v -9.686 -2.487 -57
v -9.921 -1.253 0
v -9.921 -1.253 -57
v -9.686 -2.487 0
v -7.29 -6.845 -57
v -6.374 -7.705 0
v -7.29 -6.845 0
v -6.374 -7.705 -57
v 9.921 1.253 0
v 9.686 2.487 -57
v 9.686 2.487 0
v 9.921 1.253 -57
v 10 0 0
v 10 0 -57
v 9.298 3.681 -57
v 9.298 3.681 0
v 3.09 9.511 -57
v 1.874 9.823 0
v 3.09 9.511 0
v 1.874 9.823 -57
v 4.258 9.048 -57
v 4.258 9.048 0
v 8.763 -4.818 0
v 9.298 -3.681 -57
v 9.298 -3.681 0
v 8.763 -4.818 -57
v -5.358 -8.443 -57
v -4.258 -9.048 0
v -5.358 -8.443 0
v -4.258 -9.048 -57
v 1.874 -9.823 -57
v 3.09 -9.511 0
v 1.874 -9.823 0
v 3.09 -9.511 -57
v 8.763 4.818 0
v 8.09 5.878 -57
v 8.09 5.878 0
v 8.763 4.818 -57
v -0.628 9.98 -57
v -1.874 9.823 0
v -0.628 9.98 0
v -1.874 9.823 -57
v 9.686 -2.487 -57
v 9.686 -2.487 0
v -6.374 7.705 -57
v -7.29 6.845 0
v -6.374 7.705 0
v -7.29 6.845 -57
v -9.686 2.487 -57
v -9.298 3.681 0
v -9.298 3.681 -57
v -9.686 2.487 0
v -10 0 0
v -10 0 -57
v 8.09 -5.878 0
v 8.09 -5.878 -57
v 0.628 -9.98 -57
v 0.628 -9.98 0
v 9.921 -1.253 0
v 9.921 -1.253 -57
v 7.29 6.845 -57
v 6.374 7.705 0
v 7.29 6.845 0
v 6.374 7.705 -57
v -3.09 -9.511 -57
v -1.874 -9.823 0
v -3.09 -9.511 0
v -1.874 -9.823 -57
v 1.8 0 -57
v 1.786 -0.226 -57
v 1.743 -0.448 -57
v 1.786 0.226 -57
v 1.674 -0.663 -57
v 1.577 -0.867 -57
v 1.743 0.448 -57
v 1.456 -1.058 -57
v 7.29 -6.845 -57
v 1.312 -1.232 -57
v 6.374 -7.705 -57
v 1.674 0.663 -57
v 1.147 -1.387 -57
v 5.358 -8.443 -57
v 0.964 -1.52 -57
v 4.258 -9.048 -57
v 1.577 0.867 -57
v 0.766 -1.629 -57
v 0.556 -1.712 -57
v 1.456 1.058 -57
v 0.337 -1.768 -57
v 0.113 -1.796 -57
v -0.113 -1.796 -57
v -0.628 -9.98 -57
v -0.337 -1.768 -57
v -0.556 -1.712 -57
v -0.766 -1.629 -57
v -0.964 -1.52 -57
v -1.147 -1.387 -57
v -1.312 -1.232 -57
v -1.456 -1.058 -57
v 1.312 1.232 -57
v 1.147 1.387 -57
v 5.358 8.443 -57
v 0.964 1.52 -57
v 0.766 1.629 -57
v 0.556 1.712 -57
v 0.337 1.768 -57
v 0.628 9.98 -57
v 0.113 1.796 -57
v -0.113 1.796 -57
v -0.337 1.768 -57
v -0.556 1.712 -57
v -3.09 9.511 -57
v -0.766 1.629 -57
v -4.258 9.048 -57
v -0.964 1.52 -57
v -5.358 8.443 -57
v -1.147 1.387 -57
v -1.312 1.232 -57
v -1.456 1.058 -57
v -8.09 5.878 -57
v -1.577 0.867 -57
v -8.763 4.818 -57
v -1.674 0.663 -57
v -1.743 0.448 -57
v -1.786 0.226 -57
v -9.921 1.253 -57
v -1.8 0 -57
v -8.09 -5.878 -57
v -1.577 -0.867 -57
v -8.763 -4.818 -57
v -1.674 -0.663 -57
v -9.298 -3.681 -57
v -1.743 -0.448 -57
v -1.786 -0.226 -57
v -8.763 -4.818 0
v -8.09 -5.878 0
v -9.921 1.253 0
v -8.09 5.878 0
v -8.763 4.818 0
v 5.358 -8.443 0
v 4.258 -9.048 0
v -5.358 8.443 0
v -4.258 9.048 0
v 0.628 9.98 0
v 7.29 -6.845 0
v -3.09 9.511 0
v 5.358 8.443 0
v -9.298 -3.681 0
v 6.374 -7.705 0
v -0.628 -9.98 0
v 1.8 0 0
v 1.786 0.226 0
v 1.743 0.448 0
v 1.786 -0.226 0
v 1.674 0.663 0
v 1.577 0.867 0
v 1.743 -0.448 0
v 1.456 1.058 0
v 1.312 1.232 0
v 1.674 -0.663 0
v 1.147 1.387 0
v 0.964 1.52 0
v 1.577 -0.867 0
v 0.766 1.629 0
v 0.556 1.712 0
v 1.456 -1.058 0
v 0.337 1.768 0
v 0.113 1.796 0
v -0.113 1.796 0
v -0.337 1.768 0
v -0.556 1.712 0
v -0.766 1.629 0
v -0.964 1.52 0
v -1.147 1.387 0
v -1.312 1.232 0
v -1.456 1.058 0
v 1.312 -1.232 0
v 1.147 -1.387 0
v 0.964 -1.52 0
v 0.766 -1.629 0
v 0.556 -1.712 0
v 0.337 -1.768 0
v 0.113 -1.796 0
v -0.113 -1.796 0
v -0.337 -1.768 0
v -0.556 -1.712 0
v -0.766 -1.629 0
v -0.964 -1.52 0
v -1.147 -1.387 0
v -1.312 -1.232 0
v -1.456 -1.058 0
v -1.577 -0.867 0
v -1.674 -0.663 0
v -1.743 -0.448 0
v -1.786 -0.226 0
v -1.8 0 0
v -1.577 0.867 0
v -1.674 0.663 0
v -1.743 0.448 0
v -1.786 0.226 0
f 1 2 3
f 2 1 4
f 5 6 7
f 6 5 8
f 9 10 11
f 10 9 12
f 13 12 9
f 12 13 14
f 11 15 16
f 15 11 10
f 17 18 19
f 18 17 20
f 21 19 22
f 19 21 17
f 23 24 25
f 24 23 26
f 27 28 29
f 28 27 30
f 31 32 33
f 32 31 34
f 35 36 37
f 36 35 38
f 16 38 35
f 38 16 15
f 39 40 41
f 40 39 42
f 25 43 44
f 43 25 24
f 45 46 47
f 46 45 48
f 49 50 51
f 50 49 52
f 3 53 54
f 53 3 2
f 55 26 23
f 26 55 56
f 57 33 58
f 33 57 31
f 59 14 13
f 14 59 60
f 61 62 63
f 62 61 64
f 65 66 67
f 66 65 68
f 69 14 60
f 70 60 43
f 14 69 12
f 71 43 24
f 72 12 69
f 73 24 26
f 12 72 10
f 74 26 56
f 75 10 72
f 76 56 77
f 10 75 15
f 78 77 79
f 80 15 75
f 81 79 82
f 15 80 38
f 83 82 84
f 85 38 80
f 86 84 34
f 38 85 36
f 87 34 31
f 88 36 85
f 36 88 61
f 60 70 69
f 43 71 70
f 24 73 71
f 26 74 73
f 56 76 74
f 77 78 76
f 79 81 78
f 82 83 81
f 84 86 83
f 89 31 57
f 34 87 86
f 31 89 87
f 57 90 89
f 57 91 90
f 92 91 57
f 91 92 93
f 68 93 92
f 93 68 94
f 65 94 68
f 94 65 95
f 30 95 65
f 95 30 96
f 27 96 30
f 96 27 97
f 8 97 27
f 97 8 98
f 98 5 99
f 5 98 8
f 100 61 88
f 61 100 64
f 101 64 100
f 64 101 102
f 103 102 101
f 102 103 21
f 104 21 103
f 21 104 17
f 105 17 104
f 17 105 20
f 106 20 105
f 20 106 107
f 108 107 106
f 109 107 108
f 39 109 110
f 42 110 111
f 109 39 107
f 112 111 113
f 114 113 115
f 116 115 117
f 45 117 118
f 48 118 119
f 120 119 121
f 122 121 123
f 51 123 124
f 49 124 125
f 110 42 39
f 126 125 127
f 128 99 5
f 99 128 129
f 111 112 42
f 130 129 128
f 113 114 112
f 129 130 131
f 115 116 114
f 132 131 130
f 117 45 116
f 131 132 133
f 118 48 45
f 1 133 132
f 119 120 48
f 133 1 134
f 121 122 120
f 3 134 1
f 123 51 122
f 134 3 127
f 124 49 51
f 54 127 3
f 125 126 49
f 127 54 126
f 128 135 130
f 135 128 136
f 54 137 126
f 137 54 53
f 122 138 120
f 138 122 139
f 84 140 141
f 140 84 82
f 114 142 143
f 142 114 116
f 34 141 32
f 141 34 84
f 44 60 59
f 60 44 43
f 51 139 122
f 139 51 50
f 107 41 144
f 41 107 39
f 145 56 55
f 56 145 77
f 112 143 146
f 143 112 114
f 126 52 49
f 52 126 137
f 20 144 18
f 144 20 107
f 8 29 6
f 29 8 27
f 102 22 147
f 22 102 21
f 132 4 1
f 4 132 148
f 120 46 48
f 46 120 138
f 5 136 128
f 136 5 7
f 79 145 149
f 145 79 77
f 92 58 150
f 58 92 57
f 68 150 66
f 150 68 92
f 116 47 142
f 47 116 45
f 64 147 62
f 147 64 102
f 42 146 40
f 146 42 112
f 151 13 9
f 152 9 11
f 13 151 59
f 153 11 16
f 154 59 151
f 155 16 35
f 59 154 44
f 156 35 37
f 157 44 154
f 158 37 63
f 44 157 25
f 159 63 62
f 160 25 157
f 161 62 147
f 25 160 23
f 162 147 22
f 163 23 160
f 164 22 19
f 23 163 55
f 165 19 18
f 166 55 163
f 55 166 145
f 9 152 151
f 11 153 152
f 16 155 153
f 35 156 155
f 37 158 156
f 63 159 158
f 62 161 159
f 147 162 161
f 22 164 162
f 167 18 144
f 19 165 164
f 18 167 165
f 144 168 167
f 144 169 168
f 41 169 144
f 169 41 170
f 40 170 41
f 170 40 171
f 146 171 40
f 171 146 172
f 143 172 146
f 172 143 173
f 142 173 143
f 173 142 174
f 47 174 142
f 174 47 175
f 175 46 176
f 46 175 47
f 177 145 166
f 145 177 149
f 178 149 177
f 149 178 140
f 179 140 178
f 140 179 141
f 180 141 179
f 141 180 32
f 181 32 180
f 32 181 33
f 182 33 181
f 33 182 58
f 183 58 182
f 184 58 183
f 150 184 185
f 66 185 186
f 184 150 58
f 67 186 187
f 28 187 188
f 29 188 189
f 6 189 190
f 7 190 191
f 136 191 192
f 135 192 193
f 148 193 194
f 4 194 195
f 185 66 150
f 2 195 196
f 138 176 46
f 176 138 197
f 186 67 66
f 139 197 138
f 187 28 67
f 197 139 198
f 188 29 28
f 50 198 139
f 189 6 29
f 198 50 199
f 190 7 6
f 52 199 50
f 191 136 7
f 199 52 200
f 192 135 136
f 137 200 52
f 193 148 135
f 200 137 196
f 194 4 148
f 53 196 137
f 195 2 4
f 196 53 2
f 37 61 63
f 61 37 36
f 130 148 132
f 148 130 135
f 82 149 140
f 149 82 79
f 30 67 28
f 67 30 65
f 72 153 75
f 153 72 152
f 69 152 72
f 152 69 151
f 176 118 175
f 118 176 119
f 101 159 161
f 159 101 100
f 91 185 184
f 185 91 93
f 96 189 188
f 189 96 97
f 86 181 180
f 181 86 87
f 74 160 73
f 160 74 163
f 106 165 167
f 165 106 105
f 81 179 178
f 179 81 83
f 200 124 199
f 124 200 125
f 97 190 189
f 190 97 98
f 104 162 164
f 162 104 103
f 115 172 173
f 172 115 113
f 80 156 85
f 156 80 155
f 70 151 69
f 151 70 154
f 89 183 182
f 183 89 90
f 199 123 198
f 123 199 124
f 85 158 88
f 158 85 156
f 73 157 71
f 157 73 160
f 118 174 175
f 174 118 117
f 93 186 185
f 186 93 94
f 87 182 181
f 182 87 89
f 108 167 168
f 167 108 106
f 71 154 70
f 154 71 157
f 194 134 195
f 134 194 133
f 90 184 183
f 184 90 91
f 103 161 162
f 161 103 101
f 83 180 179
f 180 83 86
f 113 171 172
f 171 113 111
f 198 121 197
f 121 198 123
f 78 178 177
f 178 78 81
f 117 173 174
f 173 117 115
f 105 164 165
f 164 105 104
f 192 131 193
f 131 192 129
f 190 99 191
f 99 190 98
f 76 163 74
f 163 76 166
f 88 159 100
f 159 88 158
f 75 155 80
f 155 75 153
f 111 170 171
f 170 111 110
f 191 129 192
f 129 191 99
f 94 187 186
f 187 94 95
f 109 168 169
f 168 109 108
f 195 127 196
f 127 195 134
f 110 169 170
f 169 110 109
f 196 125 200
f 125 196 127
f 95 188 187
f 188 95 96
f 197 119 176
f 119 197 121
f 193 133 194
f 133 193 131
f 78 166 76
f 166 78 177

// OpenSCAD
$fn = 50;


difference() {
	union() {
		translate(v = [0, 0, -57.0000000000]) {
			cylinder(h = 57, r = 10.0000000000);
		}
		cylinder(h = 0, r = 19.0000000000);
	}
	union() {
		#translate(v = [0, 0, -57]) {
			cylinder(h = 57, r = 1.8000000000);
		}
	}
}
